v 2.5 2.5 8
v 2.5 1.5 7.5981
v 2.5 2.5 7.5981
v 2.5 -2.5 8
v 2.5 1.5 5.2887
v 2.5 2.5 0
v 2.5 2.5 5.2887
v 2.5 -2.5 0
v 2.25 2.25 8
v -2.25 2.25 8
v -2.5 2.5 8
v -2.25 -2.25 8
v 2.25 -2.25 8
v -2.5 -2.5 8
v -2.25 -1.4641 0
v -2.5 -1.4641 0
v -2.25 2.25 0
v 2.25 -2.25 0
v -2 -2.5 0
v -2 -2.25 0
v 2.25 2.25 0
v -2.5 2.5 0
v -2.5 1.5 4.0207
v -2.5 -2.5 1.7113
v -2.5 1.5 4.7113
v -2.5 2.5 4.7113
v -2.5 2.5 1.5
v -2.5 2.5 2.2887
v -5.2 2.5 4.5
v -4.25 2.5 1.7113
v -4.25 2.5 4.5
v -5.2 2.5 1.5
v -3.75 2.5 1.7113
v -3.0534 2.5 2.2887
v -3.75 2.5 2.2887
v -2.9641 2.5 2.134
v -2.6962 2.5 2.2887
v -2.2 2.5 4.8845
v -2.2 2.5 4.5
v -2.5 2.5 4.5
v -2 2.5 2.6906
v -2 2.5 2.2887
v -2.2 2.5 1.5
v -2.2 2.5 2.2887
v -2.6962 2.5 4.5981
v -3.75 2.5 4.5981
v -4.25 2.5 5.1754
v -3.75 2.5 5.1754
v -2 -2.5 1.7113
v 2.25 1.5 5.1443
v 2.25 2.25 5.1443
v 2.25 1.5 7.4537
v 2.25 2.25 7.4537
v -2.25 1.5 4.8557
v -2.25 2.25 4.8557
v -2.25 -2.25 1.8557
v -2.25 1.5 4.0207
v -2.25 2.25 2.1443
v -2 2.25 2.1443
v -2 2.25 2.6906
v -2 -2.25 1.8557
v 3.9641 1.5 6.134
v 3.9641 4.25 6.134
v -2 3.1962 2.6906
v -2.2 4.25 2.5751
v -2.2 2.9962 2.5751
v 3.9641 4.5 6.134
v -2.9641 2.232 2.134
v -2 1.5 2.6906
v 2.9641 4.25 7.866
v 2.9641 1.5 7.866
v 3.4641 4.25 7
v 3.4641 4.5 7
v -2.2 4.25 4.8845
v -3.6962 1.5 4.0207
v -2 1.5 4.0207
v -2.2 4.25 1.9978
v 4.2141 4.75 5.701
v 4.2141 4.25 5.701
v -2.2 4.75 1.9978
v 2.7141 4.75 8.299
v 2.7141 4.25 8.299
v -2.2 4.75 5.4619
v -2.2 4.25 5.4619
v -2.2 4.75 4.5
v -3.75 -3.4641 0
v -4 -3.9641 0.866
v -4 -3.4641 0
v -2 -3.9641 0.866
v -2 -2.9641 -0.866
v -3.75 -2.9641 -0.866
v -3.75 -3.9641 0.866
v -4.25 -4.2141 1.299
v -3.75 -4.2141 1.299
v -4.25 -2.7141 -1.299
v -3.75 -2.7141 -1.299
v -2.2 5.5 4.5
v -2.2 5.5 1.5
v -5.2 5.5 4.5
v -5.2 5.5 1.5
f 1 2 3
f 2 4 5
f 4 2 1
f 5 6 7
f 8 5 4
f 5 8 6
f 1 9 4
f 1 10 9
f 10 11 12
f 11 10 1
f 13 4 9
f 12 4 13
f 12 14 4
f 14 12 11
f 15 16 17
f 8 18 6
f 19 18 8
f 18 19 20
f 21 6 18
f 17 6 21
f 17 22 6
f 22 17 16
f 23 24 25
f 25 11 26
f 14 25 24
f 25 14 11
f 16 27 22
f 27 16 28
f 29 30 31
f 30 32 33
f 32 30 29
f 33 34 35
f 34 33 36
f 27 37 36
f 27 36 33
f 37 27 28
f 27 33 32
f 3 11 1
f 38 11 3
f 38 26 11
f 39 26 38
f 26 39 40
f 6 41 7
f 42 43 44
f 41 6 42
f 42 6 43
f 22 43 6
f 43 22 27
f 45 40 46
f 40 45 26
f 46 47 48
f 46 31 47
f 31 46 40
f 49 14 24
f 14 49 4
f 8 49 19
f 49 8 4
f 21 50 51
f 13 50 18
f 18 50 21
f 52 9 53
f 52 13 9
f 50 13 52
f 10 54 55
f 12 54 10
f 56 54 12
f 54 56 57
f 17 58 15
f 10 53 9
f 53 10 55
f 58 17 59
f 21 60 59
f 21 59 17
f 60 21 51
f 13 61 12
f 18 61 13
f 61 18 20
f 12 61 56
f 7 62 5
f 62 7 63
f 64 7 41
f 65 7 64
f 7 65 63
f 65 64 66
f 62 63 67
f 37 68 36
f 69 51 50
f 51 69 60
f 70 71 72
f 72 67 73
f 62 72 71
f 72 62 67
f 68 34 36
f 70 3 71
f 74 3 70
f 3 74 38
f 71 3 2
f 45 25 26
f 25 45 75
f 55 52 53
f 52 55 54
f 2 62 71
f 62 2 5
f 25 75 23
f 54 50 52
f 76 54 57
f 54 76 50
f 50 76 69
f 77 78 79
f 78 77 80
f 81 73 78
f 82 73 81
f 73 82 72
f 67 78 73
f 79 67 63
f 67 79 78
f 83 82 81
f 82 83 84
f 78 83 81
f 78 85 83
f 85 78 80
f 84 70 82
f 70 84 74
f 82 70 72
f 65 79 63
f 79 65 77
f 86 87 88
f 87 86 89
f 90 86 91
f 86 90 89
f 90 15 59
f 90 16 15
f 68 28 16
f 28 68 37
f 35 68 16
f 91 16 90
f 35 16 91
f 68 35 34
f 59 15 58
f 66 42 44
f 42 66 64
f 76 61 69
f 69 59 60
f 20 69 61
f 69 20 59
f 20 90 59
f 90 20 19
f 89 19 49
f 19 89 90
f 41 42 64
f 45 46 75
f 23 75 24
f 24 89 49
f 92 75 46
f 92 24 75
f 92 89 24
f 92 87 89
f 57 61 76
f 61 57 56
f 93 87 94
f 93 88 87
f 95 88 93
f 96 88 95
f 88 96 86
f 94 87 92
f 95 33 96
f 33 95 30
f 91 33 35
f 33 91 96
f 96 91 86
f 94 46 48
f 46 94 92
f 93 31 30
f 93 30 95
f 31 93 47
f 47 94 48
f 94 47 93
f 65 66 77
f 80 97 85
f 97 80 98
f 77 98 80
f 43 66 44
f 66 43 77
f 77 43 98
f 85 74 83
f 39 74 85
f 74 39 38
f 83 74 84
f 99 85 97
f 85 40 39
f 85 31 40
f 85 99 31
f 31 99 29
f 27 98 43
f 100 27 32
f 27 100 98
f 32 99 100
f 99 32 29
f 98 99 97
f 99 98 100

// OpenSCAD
module cube_diversity(width, length, height){
    cube(size = [width, length, height], center = true);
}
//Example: translate([0,0,10]) cube_eli(3,9,1);

module cylinder_diversity(h, r1, r2, $fn){
    center = true;
    cylinder(size = [h,r1,r2,$fn]);
}
//Example: cylinder_eli(10, 10, 10, 30);

module sphere_diversity(r, $fa, $fn){
    center = true;
    sphere(size = [r,$fa,$fn]);
} 
//Example: sphere_eli(r, $fa, $fn);

translate([0,0,4]) difference(){
    cube_diversity(5,5,8);
    cube_diversity(4.5,4.5,8);
}

module spiral(){
translate([0,3,5]) rotate([0,60,0]) cube_diversity(2,3,8);
translate([0,4.5,5]) rotate([0,60,0]) cube_diversity(3,0.5,8);
translate([-3,0,2]) rotate([300,0,0]) cube_diversity(2,2,8);
translate([-4,0,2]) rotate([300,0,0]) cube_diversity(0.5,3,8);
}

difference(){
    spiral();
    translate([-3.7,4,0])cube_diversity(3,3,20);
}
translate([-3.7,4,3 ])cube_diversity(3,3,3);
